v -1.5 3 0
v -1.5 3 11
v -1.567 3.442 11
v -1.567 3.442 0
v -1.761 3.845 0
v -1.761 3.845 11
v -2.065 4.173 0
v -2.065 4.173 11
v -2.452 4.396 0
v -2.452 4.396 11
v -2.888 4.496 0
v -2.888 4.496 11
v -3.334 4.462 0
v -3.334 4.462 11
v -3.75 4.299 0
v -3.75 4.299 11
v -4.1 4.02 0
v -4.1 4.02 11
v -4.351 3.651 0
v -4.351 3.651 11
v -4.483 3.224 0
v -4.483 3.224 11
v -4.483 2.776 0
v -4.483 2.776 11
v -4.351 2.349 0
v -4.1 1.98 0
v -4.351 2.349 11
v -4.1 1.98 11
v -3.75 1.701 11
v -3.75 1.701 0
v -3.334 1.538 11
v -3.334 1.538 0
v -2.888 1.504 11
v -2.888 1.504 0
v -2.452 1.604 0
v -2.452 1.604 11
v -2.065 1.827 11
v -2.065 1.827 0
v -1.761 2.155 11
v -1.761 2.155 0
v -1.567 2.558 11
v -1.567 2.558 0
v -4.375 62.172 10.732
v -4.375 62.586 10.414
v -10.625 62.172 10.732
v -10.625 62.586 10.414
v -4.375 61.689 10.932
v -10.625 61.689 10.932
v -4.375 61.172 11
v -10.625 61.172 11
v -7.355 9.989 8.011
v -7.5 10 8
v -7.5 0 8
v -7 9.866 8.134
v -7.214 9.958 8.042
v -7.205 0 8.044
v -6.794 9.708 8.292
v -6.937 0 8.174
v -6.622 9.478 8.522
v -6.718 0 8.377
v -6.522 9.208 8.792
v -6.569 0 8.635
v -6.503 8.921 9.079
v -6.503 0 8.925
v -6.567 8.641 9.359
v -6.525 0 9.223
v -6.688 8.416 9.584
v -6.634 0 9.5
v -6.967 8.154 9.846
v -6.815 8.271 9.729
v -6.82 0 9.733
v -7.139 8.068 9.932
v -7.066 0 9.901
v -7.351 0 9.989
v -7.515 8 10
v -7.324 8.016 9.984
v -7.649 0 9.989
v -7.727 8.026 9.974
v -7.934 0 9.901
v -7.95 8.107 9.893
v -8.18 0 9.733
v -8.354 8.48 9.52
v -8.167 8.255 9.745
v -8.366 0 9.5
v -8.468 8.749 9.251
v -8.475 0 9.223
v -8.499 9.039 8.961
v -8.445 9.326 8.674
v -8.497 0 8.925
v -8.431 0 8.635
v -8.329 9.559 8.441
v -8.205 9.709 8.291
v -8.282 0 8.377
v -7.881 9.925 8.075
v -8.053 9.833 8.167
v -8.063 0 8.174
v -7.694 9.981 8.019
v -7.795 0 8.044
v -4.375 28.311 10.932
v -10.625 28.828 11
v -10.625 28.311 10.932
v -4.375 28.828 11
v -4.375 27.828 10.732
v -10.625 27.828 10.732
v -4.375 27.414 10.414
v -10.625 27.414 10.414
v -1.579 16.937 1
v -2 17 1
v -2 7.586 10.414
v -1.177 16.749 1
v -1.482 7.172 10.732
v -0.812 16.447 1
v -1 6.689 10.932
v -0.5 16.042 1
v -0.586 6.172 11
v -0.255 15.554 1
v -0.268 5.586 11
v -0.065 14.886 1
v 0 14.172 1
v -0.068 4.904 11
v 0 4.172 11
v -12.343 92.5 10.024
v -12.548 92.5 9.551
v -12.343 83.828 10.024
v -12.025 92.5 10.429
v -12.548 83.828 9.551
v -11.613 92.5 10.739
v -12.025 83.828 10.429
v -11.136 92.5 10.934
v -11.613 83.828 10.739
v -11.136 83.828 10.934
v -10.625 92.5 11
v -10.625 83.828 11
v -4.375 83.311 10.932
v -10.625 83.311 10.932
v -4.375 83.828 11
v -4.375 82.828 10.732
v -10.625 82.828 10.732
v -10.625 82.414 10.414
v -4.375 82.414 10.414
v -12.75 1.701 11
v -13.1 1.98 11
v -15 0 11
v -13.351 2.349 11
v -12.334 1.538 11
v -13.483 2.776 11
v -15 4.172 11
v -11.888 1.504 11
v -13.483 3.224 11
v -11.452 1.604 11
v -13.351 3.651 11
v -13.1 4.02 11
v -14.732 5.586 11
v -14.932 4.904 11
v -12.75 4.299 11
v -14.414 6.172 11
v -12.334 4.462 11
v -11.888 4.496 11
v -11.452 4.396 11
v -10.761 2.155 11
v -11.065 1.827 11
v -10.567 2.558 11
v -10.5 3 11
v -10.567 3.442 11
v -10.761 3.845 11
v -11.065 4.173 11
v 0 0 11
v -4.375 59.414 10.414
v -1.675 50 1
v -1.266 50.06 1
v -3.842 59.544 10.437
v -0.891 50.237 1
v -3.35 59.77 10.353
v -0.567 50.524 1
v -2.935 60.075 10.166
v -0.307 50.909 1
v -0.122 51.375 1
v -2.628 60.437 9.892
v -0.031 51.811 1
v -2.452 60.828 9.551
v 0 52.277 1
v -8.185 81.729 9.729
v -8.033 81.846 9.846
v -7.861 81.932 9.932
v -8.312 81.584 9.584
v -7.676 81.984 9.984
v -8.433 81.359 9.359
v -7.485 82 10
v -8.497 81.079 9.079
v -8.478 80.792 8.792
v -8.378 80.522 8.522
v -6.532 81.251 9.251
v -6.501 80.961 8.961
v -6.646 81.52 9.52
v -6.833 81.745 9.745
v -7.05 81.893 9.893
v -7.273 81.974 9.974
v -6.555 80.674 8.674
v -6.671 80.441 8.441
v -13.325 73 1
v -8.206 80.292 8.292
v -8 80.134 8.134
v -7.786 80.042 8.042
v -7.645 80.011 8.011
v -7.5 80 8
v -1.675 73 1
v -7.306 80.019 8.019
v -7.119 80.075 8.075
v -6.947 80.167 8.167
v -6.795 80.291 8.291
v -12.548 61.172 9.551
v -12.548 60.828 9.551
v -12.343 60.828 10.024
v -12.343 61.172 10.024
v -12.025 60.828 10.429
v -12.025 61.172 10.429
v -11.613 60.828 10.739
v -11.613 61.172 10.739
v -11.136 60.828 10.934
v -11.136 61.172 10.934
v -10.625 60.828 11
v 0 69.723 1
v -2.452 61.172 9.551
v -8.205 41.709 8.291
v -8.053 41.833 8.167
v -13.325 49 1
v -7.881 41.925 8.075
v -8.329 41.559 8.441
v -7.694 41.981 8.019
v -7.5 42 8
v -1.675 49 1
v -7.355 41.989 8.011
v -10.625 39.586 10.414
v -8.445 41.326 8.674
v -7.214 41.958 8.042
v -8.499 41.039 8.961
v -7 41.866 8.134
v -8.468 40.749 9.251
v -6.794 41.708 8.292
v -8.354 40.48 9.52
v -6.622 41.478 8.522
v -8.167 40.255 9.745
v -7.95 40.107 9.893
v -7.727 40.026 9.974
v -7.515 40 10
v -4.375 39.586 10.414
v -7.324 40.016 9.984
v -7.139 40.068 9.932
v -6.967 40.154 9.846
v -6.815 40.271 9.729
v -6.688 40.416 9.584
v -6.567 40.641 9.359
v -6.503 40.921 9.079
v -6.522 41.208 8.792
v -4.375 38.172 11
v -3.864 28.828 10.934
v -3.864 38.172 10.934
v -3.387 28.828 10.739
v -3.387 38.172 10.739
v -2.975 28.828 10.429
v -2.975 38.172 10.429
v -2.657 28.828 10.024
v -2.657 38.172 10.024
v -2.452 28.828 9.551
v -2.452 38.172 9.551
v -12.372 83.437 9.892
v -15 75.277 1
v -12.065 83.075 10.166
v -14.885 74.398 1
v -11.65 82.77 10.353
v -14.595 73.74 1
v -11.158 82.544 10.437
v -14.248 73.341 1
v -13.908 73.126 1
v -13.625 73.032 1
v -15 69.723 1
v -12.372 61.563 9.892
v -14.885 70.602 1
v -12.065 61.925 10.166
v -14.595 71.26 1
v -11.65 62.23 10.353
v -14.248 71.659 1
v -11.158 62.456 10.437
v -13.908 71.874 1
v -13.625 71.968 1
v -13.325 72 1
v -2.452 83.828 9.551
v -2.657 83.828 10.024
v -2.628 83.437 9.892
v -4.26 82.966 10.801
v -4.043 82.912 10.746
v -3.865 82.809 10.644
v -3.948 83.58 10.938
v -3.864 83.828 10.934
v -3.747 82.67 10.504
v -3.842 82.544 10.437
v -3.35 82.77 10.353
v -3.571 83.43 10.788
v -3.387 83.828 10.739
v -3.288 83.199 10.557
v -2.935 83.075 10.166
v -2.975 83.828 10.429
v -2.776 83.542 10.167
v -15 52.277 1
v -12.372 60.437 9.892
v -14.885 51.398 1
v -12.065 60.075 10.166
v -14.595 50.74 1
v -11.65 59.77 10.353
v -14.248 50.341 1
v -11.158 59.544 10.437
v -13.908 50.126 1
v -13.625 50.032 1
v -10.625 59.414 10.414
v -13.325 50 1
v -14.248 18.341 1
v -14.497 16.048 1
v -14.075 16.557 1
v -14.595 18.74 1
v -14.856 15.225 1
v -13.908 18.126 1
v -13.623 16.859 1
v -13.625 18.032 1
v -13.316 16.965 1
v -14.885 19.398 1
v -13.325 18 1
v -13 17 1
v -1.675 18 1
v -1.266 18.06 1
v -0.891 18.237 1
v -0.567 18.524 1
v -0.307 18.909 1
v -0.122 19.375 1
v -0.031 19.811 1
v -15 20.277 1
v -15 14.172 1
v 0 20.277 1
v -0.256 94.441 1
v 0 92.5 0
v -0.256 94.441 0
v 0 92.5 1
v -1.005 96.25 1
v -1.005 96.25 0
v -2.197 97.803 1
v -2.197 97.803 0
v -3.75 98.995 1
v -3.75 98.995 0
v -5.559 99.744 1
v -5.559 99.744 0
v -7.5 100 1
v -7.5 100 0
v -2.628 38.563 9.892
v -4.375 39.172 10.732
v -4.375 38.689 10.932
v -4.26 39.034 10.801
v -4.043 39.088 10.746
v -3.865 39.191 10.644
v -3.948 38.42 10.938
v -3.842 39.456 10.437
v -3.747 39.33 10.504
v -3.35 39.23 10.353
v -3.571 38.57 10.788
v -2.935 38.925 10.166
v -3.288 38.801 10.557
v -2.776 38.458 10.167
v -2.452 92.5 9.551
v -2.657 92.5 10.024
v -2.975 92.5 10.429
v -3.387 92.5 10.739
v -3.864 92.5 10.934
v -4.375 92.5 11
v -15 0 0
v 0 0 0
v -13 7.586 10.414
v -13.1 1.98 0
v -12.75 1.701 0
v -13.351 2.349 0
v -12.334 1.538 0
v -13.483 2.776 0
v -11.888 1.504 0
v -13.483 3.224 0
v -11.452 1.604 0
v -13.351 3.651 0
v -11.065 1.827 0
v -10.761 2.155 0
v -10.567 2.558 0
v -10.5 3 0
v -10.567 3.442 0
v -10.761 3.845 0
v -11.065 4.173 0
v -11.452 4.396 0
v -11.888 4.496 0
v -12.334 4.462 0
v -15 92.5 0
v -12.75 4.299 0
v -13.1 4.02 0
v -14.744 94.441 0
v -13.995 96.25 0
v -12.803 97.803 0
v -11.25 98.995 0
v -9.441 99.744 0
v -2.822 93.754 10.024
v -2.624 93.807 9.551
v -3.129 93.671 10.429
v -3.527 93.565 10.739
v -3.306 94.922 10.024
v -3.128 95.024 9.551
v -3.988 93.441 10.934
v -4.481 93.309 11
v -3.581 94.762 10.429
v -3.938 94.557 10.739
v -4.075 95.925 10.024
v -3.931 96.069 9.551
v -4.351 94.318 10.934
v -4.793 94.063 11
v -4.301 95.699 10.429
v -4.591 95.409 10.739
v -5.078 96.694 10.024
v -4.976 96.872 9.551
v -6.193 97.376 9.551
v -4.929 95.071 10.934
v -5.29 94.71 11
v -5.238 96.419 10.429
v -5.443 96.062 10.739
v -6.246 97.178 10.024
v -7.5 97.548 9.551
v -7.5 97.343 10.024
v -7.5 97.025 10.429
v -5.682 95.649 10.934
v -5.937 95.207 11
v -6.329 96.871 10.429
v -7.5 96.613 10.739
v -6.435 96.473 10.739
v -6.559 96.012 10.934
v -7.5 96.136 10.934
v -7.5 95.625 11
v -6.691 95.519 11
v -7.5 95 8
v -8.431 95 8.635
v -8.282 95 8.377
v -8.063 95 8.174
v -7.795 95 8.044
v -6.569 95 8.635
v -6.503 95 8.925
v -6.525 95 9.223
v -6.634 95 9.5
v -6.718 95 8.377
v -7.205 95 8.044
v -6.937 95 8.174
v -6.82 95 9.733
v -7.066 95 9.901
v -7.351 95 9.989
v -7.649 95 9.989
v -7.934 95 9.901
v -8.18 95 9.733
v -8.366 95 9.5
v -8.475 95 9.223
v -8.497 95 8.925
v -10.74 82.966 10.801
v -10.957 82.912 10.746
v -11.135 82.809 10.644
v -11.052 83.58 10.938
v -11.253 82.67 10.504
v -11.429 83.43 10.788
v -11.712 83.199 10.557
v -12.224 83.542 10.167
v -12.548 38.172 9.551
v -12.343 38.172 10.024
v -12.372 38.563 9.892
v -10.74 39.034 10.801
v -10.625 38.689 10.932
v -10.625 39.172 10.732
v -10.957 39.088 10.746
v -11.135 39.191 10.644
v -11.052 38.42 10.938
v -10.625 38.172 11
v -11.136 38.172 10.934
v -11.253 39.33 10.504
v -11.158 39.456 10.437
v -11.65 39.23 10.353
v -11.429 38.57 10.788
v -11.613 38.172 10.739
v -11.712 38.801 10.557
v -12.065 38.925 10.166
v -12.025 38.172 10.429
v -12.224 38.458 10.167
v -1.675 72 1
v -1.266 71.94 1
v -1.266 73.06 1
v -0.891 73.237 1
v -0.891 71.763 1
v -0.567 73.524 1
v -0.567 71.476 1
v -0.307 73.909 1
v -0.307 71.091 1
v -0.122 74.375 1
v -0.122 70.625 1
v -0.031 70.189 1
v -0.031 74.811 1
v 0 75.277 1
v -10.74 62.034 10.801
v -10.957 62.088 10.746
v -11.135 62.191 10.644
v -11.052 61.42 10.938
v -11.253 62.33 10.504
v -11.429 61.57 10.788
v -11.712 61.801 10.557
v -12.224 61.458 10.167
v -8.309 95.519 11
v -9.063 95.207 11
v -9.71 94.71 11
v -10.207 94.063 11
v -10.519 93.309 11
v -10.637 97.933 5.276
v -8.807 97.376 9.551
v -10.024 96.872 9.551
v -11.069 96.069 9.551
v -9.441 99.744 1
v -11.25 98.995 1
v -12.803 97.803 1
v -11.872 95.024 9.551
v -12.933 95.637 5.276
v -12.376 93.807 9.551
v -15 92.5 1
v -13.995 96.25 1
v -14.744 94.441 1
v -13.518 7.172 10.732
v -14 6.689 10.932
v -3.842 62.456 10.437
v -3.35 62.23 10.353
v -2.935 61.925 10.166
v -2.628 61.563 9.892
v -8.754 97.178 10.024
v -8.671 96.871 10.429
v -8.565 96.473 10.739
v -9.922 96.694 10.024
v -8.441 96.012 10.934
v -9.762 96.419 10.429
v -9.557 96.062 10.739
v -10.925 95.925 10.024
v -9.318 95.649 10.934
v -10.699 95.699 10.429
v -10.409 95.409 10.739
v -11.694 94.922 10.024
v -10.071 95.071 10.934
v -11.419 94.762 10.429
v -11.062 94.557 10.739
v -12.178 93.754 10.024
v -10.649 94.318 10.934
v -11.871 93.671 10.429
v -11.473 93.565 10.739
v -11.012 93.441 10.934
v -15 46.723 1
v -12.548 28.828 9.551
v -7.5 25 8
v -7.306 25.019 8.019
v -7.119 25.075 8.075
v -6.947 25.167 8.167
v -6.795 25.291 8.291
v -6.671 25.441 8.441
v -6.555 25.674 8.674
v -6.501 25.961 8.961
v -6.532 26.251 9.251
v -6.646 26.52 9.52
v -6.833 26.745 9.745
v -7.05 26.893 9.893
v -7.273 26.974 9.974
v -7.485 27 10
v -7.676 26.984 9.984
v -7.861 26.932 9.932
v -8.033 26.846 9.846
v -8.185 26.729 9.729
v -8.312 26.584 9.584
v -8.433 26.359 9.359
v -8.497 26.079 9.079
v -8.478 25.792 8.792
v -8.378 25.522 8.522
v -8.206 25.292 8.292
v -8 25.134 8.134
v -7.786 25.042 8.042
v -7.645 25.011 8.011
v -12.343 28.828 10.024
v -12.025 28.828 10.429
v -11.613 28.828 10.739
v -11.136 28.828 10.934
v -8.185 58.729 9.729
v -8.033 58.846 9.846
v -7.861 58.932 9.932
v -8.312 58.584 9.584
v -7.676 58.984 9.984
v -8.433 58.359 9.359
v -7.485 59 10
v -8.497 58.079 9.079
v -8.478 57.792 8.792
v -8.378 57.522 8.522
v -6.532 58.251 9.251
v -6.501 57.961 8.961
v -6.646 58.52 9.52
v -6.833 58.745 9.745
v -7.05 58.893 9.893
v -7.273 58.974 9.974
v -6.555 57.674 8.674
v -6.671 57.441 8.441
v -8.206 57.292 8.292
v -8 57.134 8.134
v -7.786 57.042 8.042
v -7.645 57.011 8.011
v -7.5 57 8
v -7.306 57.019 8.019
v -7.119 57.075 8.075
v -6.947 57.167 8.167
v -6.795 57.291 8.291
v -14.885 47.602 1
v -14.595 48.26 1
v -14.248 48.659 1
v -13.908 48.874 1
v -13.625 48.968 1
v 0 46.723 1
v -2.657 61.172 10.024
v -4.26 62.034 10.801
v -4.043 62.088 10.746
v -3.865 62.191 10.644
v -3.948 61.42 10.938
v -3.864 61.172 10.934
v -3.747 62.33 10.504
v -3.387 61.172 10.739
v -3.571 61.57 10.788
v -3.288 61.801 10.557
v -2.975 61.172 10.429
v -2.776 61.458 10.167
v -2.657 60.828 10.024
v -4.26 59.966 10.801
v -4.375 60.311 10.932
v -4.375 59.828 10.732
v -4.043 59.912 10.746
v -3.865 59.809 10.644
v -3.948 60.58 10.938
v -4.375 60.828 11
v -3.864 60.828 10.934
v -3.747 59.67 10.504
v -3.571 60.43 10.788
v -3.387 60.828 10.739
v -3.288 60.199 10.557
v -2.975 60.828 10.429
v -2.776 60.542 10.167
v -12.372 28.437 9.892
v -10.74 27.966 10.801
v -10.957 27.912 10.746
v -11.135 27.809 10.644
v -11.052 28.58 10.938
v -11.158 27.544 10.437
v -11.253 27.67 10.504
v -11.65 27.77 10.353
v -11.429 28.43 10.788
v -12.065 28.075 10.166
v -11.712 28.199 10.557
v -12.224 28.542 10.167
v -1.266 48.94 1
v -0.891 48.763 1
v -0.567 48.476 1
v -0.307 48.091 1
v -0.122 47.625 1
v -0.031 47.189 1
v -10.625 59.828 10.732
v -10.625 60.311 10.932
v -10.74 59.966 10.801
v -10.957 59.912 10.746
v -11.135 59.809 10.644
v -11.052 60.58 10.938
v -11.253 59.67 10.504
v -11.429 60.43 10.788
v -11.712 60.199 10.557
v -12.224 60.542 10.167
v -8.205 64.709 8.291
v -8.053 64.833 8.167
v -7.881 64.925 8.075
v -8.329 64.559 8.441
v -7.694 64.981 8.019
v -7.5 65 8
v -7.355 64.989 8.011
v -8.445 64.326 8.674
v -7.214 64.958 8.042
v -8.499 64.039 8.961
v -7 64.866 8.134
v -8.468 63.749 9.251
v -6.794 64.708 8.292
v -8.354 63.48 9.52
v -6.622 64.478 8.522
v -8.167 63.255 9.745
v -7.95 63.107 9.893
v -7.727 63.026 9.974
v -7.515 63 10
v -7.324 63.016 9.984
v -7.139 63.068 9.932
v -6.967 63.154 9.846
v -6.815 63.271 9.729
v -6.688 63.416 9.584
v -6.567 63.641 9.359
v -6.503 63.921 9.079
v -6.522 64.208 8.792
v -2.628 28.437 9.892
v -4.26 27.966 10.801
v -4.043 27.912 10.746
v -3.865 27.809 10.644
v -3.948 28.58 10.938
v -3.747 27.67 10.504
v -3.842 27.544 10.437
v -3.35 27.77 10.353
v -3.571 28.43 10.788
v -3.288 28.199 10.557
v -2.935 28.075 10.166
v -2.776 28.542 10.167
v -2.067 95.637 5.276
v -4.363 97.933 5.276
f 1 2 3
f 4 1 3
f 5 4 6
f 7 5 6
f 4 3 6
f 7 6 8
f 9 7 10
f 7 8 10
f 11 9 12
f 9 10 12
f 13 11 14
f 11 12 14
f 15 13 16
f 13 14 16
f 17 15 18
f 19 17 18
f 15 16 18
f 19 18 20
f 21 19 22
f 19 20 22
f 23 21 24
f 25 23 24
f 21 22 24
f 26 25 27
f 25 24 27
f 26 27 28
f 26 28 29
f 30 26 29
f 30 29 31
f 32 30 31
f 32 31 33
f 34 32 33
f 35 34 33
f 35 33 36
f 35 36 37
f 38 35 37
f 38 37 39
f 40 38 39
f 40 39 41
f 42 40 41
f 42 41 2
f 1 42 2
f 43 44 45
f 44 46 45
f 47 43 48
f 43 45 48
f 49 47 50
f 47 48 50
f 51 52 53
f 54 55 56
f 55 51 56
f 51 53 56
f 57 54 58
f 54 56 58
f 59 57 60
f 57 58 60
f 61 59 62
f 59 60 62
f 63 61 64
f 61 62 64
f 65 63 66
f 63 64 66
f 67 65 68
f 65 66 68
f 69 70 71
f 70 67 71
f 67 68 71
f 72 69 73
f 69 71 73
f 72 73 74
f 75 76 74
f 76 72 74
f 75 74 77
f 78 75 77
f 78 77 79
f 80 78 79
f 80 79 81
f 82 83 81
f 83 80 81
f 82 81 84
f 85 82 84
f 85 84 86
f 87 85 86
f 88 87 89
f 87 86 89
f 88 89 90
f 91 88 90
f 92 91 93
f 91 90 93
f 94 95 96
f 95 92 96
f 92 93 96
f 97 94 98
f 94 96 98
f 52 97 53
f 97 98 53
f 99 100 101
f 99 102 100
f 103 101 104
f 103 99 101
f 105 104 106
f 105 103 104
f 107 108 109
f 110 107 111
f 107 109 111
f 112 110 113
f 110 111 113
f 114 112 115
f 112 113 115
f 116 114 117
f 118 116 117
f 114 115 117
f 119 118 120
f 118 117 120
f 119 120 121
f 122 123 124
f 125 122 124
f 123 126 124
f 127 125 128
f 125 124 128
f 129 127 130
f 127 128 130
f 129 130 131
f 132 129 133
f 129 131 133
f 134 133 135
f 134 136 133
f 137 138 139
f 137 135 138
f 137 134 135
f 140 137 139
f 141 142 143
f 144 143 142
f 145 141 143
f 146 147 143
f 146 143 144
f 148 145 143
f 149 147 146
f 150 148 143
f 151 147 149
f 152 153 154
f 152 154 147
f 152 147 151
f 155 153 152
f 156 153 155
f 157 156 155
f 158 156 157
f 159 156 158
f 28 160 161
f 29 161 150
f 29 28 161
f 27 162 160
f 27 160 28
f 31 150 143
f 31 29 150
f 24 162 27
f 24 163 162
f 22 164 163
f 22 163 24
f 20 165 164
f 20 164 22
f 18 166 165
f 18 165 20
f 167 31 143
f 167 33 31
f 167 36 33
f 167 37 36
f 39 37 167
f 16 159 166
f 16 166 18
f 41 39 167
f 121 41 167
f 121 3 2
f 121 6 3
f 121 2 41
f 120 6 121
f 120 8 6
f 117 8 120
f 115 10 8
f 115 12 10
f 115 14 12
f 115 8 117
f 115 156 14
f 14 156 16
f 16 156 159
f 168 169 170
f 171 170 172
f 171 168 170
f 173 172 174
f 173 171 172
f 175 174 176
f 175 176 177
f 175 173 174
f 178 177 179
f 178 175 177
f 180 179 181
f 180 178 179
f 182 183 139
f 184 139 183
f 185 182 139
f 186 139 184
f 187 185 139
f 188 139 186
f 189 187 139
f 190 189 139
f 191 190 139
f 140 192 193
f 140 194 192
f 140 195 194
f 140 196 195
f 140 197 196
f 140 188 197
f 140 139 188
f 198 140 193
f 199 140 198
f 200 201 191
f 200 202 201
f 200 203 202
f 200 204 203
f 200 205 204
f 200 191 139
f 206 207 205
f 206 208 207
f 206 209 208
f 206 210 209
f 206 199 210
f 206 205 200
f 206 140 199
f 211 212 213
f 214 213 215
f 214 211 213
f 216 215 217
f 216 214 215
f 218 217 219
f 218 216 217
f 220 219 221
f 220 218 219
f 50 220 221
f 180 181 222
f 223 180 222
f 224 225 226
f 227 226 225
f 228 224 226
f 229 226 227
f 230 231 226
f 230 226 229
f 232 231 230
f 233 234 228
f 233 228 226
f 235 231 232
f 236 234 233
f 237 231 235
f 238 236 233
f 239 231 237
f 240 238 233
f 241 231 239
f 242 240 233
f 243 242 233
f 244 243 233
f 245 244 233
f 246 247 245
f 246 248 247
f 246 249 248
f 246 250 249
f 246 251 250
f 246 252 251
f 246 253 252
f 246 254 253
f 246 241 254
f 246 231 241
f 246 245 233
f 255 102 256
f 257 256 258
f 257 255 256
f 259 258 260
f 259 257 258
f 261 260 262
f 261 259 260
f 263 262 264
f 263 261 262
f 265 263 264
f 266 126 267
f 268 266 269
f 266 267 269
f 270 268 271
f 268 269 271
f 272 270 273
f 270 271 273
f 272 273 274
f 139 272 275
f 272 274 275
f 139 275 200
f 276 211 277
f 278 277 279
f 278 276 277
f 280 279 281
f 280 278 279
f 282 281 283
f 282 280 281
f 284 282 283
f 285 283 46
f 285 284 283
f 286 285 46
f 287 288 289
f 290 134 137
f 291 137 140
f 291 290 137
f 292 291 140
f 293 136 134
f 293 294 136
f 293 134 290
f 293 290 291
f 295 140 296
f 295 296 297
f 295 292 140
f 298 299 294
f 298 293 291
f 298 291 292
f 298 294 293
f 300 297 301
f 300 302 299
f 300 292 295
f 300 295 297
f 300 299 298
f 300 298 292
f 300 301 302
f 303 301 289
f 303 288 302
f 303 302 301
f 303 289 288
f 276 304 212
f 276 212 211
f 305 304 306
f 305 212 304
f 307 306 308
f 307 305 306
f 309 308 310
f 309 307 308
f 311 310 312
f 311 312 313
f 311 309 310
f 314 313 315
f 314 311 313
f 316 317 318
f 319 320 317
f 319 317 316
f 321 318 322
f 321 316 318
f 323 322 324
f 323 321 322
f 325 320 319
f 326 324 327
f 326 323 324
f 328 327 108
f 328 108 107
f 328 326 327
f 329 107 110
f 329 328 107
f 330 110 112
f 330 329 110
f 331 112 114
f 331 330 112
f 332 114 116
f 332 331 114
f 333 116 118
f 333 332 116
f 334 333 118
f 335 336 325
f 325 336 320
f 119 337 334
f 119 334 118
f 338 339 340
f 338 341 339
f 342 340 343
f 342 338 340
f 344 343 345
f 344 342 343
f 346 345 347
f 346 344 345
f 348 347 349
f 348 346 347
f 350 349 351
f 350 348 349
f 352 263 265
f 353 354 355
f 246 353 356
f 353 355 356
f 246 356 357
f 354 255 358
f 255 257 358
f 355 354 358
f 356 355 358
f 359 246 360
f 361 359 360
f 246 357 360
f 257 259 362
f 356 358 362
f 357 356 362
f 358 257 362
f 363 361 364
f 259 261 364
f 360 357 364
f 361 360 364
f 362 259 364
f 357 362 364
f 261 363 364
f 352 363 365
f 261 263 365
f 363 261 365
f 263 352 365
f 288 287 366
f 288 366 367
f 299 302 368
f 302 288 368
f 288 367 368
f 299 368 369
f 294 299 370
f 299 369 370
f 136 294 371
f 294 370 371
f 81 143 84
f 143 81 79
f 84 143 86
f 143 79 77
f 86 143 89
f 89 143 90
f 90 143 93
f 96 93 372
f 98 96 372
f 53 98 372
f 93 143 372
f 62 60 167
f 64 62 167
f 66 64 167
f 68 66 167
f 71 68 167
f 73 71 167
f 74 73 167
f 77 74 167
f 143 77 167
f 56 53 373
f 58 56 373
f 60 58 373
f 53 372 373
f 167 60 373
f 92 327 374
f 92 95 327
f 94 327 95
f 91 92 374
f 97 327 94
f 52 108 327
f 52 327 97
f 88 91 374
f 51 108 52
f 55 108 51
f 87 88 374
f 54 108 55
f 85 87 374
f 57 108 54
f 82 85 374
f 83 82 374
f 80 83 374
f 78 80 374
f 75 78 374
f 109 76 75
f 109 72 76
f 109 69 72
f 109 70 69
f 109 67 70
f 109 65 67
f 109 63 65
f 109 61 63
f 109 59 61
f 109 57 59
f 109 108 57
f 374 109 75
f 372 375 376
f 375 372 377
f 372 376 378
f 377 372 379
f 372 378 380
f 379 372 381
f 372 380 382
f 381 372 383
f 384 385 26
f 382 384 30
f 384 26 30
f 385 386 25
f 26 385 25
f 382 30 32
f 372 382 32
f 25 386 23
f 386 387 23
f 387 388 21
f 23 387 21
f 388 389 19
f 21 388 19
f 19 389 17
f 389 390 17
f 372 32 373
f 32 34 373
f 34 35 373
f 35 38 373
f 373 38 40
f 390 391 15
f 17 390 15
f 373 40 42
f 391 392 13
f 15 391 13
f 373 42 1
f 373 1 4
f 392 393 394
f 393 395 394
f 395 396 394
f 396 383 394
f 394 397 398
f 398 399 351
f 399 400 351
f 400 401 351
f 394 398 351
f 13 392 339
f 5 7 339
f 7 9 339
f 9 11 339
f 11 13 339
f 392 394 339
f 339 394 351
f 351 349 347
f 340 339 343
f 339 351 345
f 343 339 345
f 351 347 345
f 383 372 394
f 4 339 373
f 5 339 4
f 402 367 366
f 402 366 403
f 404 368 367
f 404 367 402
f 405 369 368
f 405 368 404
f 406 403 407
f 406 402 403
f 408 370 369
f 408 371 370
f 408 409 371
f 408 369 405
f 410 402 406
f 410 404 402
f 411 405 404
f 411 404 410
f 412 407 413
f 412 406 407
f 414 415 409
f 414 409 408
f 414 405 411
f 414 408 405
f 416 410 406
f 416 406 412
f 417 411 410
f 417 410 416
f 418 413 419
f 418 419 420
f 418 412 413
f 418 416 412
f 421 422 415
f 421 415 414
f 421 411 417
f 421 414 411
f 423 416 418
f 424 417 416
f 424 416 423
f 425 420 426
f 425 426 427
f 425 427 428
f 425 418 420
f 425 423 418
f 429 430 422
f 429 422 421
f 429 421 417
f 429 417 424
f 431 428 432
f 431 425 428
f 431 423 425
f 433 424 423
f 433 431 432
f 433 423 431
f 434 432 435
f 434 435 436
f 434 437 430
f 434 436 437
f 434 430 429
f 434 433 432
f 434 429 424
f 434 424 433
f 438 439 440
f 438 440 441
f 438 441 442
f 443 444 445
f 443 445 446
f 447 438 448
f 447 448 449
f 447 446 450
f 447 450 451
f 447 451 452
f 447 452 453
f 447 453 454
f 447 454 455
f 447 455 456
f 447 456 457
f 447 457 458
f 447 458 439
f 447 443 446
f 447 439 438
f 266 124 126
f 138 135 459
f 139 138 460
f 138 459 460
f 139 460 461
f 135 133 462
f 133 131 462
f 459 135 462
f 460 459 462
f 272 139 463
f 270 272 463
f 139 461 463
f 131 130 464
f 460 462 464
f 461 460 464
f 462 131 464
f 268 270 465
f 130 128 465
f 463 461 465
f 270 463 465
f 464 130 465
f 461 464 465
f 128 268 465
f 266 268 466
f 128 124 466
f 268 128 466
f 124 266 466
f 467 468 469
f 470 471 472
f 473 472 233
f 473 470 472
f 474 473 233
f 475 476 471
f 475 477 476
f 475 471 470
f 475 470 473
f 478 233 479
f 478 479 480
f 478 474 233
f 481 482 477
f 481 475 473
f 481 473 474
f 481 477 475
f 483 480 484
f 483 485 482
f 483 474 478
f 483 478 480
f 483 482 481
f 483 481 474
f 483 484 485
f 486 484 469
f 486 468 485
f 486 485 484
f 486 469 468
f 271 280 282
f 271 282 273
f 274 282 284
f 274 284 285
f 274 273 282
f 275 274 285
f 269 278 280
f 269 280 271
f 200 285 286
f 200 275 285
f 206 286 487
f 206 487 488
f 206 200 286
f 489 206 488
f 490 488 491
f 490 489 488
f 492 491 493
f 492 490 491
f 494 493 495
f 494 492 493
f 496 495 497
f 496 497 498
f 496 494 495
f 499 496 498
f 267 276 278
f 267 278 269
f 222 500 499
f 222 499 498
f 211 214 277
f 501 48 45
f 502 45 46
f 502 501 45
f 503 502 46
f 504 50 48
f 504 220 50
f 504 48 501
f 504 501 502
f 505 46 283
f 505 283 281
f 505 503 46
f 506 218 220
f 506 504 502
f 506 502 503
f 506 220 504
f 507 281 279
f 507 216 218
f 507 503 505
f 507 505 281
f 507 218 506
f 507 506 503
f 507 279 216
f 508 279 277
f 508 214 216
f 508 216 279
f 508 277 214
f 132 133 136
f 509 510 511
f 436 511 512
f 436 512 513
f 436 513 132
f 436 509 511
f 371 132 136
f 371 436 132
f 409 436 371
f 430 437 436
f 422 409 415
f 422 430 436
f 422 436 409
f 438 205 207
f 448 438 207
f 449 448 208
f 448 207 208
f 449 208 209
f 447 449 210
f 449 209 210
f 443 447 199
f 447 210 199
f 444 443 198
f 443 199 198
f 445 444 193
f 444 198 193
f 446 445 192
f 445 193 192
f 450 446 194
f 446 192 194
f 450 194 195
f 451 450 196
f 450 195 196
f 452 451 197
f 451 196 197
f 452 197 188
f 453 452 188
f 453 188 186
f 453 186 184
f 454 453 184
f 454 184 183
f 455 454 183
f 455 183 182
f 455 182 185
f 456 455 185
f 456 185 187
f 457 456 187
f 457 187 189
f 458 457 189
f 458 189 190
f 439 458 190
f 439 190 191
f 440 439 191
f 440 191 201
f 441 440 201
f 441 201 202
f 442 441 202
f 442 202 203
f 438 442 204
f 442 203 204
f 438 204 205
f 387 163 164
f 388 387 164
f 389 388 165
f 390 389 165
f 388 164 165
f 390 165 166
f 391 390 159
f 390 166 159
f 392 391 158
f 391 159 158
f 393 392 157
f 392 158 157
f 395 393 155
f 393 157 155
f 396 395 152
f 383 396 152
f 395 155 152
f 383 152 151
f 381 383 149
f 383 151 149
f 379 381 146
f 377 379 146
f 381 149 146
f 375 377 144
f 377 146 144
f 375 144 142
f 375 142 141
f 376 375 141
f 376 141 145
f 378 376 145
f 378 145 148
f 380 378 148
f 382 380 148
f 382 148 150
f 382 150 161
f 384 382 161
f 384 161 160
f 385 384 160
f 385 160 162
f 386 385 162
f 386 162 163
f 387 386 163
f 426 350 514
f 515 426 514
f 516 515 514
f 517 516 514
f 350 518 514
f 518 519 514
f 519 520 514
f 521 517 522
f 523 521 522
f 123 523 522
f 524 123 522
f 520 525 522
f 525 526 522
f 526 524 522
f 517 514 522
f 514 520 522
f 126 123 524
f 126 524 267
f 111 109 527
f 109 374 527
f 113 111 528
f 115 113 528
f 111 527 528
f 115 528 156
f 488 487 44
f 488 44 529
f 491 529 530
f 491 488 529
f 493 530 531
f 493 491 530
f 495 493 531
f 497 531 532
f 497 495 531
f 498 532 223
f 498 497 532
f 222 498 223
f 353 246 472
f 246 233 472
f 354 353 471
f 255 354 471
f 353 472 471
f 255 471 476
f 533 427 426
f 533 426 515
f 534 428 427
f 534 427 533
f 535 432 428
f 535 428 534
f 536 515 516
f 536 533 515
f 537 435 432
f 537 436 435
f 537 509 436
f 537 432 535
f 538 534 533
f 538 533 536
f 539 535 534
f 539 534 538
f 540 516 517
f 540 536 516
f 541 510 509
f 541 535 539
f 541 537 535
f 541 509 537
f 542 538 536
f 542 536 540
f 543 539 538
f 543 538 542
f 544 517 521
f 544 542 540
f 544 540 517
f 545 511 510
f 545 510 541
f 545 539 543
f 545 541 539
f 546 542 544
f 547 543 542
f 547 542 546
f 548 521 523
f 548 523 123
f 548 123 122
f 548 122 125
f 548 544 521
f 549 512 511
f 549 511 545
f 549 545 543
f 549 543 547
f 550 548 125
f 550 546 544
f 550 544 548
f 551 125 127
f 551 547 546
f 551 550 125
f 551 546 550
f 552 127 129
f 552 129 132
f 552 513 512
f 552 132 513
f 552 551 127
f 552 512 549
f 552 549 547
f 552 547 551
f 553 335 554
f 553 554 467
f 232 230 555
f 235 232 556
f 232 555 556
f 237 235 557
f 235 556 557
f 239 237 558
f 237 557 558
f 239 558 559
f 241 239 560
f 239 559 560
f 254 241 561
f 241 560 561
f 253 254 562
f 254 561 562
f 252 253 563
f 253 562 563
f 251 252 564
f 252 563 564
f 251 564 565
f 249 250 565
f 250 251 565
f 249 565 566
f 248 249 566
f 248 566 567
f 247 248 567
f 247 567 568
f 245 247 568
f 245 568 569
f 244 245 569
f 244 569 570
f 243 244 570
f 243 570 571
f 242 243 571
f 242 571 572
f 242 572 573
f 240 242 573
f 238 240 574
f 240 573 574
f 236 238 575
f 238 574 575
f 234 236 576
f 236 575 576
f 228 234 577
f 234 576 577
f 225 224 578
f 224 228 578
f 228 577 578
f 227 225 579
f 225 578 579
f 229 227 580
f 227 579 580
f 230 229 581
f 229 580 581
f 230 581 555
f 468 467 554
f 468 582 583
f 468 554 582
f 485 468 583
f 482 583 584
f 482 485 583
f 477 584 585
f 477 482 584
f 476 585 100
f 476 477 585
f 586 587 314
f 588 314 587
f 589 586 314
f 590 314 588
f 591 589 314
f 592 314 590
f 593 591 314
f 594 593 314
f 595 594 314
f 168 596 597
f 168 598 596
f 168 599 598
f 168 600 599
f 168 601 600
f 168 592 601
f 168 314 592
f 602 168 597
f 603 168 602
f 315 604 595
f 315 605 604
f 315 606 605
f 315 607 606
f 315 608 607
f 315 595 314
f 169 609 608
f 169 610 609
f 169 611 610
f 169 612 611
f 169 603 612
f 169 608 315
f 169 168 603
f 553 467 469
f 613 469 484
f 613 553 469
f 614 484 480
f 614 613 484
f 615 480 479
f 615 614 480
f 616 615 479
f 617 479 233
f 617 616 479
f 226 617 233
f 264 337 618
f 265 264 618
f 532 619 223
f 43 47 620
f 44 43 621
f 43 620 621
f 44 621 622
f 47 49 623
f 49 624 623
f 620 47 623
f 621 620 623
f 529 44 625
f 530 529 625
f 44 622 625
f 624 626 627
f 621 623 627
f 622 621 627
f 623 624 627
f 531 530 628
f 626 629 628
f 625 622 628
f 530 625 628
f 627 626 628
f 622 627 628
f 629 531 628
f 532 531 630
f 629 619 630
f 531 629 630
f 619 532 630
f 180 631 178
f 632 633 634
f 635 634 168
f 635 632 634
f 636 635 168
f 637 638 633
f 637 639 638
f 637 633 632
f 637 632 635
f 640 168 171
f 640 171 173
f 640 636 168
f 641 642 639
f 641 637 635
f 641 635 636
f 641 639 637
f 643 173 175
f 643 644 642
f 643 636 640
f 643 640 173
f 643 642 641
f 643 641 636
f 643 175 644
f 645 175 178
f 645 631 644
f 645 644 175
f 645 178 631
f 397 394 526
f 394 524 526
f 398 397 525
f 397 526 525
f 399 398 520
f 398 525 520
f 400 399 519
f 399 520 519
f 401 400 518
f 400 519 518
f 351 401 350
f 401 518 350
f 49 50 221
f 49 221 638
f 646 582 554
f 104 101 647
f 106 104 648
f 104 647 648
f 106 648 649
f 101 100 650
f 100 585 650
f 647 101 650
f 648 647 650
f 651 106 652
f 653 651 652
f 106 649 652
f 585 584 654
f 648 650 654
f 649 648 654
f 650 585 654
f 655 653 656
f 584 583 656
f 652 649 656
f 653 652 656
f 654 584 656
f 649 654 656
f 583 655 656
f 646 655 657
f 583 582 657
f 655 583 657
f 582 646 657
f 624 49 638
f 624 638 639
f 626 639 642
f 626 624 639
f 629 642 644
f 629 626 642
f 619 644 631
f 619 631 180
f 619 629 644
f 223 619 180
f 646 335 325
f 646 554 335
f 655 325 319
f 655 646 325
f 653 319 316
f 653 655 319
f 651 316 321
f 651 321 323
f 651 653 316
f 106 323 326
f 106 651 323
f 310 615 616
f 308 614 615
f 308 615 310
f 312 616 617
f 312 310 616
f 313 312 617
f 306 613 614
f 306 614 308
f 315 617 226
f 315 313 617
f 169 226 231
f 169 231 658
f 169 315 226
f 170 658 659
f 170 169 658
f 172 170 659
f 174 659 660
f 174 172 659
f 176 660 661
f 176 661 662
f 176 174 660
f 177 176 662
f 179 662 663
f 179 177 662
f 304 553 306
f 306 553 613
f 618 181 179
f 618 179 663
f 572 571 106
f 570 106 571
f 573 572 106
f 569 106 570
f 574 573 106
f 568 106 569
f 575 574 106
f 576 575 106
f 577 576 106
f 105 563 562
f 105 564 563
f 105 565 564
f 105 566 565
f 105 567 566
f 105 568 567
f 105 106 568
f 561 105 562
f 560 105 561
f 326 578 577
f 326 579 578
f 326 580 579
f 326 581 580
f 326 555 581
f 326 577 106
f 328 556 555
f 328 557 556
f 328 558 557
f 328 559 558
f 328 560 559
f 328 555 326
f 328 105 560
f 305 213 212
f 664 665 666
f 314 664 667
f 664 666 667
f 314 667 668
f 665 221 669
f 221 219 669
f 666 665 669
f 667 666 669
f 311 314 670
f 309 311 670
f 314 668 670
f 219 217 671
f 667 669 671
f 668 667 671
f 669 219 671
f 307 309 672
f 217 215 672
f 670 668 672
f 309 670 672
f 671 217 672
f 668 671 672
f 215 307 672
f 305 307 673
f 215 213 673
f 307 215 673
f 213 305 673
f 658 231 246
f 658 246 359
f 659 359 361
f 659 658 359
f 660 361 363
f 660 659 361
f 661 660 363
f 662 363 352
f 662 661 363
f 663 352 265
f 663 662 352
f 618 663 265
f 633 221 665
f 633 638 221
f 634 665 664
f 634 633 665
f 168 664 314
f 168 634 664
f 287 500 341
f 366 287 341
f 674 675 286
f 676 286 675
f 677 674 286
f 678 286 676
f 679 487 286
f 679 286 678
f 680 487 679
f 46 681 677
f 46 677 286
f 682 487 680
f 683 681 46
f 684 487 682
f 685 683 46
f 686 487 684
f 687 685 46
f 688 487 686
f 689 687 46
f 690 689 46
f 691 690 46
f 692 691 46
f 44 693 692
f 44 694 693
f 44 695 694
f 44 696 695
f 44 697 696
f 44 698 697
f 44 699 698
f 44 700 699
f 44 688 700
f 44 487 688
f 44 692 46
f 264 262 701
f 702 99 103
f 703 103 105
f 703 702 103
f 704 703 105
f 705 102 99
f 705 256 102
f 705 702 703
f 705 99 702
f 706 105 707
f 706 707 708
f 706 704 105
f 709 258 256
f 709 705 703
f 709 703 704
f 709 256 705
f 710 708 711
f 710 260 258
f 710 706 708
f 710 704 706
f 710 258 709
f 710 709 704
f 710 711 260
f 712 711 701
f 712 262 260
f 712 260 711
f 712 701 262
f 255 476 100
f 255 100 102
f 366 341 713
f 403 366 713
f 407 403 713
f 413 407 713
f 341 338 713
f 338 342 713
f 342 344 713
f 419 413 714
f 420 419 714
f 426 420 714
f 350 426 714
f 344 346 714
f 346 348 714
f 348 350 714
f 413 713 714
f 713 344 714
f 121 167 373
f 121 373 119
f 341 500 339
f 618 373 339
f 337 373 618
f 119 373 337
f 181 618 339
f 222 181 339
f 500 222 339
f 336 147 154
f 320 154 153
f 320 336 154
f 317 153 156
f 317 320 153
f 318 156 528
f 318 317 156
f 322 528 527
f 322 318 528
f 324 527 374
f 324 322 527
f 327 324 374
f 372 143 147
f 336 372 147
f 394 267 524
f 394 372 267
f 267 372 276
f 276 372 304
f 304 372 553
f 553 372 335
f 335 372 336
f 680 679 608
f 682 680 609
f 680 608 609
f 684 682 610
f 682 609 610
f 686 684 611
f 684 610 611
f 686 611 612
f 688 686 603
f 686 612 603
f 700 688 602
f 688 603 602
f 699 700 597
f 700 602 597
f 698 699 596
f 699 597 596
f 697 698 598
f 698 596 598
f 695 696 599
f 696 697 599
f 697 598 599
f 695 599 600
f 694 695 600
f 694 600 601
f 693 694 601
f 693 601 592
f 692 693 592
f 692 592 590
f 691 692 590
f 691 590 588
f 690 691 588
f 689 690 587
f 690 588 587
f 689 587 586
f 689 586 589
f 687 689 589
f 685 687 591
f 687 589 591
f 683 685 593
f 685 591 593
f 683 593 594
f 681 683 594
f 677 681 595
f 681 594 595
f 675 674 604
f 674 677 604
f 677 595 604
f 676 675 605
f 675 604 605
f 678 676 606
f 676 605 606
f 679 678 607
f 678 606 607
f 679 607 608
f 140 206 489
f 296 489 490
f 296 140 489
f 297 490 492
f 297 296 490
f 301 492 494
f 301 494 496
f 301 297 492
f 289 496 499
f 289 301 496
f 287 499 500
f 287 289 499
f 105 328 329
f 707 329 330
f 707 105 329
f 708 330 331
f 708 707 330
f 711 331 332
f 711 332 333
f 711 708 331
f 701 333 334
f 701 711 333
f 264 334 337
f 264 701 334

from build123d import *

# Parameters (mm, degrees)
SKETCH1_W                     = 15
SKETCH1_H                     = 100
BOSS_EXTRUDE1_DEPTH           = 1
FILLET1_R                     = 7.5
BOSS_EXTRUDE2_DEPTH           = 10
BOSS_EXTRUDE2_DRAFT           = 16
SKETCH3_W                     = 15
SKETCH3_H                     = 22
BOSS_EXTRUDE2_PROFILE_2_DEPTH = 10
BOSS_EXTRUDE2_PROFILE_2_DRAFT = 16
SKETCH3_H_2                   = 31
BOSS_EXTRUDE2_PROFILE_3_DEPTH = 10
BOSS_EXTRUDE2_PROFILE_3_DRAFT = 16
SKETCH3_3_W                   = 15
SKETCH3_3_H                   = 17
BOSS_EXTRUDE3_DEPTH           = 10
CUT_EXTRUDE1_DEPTH            = 102.71528892
SKETCH5_R                     = 1
CUT_EXTRUDE2_DEPTH            = 95
FILLET2_R                     = 2
SKETCH6_R                     = 1.5
CUT_EXTRUDE3_DEPTH            = 102.71528892


with BuildPart() as part:
    # Sketch1 → Boss-Extrude1 (new body)
    with BuildSketch(Plane.XY):
        with Locations((-7.5, 50)):
            Rectangle(SKETCH1_W, SKETCH1_H)
    extrude(amount=BOSS_EXTRUDE1_DEPTH)

    # Fillet1
    fillet1_edges = [part.edges().sort_by_distance(p)[0] for p in [
        (0, 100, 0.5),
        (-15, 100, 0.5),
    ]]
    fillet(fillet1_edges, radius=FILLET1_R - 0.0001)  # a hair under: the kernel refuses the full size


with BuildPart() as boss_extrude2_tool:
    # Sketch3 → Boss-Extrude2 (with draft: the straight prism first)
    with BuildSketch(Plane.XY.offset(1)):
        with BuildLine():
            ThreePointArc((-7.5, 100), (-12.803300859, 97.803300859), (-15, 92.5))
            Line((-15, 92.5), (-15, 73))
            Line((-15, 73), (0, 73))
            Line((0, 73), (0, 92.5))
            ThreePointArc((0, 92.5), (-2.196699141, 97.803300859), (-7.5, 100))
        make_face()
    extrude(amount=BOSS_EXTRUDE2_DEPTH)
    # Boss-Extrude2: the draft: its side faces are tilted about the plane it starts from
    boss_extrude2_sides = [boss_extrude2_tool.faces().sort_by_distance(p)[0] for p in [
        (-7.5, 100, 6),
        (-7.5, 73, 6),
        (0, 82.75, 6),
        (-15, 82.75, 6),
    ]]
    draft(boss_extrude2_sides, Plane.XY.offset(1), BOSS_EXTRUDE2_DRAFT)


with BuildPart() as part_1:
    add(part.part)

    # Boss-Extrude2: add boss_extrude2_tool
    add(boss_extrude2_tool.part)


with BuildPart() as boss_extrude2_profile_2_tool:
    # Sketch3 → Boss-Extrude2 profile 2 (with draft: the straight prism first)
    with BuildSketch(Plane.XY.offset(1)):
        with Locations((-7.5, 61)):
            Rectangle(SKETCH3_W, SKETCH3_H)
    extrude(amount=BOSS_EXTRUDE2_PROFILE_2_DEPTH)
    # Boss-Extrude2 profile 2: the draft: its side faces are tilted about the plane it starts from
    boss_extrude2_profile_2_sides = [boss_extrude2_profile_2_tool.faces().sort_by_distance(p)[0] for p in [
        (-7.5, 72, 6),
        (-15, 61, 6),
        (-7.5, 50, 6),
        (0, 61, 6),
    ]]
    draft(boss_extrude2_profile_2_sides, Plane.XY.offset(1), BOSS_EXTRUDE2_PROFILE_2_DRAFT)


with BuildPart() as part_2:
    add(part_1.part)

    # Boss-Extrude2 profile 2: add boss_extrude2_profile_2_tool
    add(boss_extrude2_profile_2_tool.part)


with BuildPart() as boss_extrude2_profile_3_tool:
    # Sketch3 → Boss-Extrude2 profile 3 (with draft: the straight prism first)
    with BuildSketch(Plane.XY.offset(1)):
        with Locations((-7.5, 33.5)):
            Rectangle(SKETCH3_W, SKETCH3_H_2)
    extrude(amount=BOSS_EXTRUDE2_PROFILE_3_DEPTH)
    # Boss-Extrude2 profile 3: the draft: its side faces are tilted about the plane it starts from
    boss_extrude2_profile_3_sides = [boss_extrude2_profile_3_tool.faces().sort_by_distance(p)[0] for p in [
        (-7.5, 18, 6),
        (0, 33.5, 6),
        (-7.5, 49, 6),
        (-15, 33.5, 6),
    ]]
    draft(boss_extrude2_profile_3_sides, Plane.XY.offset(1), BOSS_EXTRUDE2_PROFILE_3_DRAFT)


with BuildPart() as part_3:
    add(part_2.part)

    # Boss-Extrude2 profile 3: add boss_extrude2_profile_3_tool
    add(boss_extrude2_profile_3_tool.part)

    # Sketch3<3> → Boss-Extrude3 (add)
    with BuildSketch(Plane.XY.offset(1)):
        with Locations((-7.5, 8.5)):
            Rectangle(SKETCH3_3_W, SKETCH3_3_H)
    extrude(amount=BOSS_EXTRUDE3_DEPTH)

    # Sketch4 → Cut-Extrude1 (cut, through all)
    with BuildSketch(Plane(origin=(0, 0, 0), x_dir=(0, 0, -1), z_dir=(1, 0, 0))):
        Polygon((-14.618204018, 86.618204018), (-1, 73), (-1, 72), (-12, 61), (-1, 50), (-1, 49), (-14.71384308, 35.28615692), (-14.71384308, 31.71384308), (-1, 18), (-1, 17), (-14.311925723, 3.688074277), (-29.385419391, 3.688074277), (-29.385419391, 86.618204018), align=None)
    extrude(amount=-CUT_EXTRUDE1_DEPTH, mode=Mode.SUBTRACT)

    # Sketch5 → Cut-Extrude2 (cut)
    with BuildSketch(Plane.XZ):
        with Locations(Location((-7.5, 9, 0), (0, 0, 270))):
            Circle(SKETCH5_R)
    extrude(amount=-CUT_EXTRUDE2_DEPTH, mode=Mode.SUBTRACT)

    # Fillet2
    fillet2_edges = [part_3.edges().sort_by_distance(p)[0] for p in [
        (-15, 12, 6),
        (0, 12, 6),
        (-12.132546142, 87.75, 11),
        (-7.5, 97.132546142, 11),
        (-7.5, 7, 11),
        (-12.132546142, 33.5, 11),
        (-2.867453858, 33.5, 11),
        (-7.5, 28, 11),
        (-7.5, 39, 11),
        (-12.132546142, 61, 11),
        (-2.867453858, 61, 11),
        (-7.5, 60, 11),
        (-7.5, 62, 11),
        (-2.867453858, 87.75, 11),
        (-7.5, 83, 11),
        (-13.566273071, 78, 6),
        (-1.433726929, 78, 6),
        (-13.566273071, 67, 6),
        (-1.433726929, 67, 6),
        (-13.566273071, 55, 6),
        (-1.433726929, 55, 6),
        (-13.566273071, 44, 6),
        (-1.433726929, 44, 6),
        (-13.566273071, 23, 6),
        (-1.433726929, 23, 6),
    ]]
    fillet(fillet2_edges, radius=FILLET2_R)

    # Sketch6 → Cut-Extrude3 (cut, through all)
    with BuildSketch(Plane.XY.offset(11)):
        with Locations((-12, 3)):
            Circle(SKETCH6_R)
        with Locations((-3, 3)):
            Circle(SKETCH6_R)
    extrude(amount=-CUT_EXTRUDE3_DEPTH, mode=Mode.SUBTRACT)


solid = part_3.part
